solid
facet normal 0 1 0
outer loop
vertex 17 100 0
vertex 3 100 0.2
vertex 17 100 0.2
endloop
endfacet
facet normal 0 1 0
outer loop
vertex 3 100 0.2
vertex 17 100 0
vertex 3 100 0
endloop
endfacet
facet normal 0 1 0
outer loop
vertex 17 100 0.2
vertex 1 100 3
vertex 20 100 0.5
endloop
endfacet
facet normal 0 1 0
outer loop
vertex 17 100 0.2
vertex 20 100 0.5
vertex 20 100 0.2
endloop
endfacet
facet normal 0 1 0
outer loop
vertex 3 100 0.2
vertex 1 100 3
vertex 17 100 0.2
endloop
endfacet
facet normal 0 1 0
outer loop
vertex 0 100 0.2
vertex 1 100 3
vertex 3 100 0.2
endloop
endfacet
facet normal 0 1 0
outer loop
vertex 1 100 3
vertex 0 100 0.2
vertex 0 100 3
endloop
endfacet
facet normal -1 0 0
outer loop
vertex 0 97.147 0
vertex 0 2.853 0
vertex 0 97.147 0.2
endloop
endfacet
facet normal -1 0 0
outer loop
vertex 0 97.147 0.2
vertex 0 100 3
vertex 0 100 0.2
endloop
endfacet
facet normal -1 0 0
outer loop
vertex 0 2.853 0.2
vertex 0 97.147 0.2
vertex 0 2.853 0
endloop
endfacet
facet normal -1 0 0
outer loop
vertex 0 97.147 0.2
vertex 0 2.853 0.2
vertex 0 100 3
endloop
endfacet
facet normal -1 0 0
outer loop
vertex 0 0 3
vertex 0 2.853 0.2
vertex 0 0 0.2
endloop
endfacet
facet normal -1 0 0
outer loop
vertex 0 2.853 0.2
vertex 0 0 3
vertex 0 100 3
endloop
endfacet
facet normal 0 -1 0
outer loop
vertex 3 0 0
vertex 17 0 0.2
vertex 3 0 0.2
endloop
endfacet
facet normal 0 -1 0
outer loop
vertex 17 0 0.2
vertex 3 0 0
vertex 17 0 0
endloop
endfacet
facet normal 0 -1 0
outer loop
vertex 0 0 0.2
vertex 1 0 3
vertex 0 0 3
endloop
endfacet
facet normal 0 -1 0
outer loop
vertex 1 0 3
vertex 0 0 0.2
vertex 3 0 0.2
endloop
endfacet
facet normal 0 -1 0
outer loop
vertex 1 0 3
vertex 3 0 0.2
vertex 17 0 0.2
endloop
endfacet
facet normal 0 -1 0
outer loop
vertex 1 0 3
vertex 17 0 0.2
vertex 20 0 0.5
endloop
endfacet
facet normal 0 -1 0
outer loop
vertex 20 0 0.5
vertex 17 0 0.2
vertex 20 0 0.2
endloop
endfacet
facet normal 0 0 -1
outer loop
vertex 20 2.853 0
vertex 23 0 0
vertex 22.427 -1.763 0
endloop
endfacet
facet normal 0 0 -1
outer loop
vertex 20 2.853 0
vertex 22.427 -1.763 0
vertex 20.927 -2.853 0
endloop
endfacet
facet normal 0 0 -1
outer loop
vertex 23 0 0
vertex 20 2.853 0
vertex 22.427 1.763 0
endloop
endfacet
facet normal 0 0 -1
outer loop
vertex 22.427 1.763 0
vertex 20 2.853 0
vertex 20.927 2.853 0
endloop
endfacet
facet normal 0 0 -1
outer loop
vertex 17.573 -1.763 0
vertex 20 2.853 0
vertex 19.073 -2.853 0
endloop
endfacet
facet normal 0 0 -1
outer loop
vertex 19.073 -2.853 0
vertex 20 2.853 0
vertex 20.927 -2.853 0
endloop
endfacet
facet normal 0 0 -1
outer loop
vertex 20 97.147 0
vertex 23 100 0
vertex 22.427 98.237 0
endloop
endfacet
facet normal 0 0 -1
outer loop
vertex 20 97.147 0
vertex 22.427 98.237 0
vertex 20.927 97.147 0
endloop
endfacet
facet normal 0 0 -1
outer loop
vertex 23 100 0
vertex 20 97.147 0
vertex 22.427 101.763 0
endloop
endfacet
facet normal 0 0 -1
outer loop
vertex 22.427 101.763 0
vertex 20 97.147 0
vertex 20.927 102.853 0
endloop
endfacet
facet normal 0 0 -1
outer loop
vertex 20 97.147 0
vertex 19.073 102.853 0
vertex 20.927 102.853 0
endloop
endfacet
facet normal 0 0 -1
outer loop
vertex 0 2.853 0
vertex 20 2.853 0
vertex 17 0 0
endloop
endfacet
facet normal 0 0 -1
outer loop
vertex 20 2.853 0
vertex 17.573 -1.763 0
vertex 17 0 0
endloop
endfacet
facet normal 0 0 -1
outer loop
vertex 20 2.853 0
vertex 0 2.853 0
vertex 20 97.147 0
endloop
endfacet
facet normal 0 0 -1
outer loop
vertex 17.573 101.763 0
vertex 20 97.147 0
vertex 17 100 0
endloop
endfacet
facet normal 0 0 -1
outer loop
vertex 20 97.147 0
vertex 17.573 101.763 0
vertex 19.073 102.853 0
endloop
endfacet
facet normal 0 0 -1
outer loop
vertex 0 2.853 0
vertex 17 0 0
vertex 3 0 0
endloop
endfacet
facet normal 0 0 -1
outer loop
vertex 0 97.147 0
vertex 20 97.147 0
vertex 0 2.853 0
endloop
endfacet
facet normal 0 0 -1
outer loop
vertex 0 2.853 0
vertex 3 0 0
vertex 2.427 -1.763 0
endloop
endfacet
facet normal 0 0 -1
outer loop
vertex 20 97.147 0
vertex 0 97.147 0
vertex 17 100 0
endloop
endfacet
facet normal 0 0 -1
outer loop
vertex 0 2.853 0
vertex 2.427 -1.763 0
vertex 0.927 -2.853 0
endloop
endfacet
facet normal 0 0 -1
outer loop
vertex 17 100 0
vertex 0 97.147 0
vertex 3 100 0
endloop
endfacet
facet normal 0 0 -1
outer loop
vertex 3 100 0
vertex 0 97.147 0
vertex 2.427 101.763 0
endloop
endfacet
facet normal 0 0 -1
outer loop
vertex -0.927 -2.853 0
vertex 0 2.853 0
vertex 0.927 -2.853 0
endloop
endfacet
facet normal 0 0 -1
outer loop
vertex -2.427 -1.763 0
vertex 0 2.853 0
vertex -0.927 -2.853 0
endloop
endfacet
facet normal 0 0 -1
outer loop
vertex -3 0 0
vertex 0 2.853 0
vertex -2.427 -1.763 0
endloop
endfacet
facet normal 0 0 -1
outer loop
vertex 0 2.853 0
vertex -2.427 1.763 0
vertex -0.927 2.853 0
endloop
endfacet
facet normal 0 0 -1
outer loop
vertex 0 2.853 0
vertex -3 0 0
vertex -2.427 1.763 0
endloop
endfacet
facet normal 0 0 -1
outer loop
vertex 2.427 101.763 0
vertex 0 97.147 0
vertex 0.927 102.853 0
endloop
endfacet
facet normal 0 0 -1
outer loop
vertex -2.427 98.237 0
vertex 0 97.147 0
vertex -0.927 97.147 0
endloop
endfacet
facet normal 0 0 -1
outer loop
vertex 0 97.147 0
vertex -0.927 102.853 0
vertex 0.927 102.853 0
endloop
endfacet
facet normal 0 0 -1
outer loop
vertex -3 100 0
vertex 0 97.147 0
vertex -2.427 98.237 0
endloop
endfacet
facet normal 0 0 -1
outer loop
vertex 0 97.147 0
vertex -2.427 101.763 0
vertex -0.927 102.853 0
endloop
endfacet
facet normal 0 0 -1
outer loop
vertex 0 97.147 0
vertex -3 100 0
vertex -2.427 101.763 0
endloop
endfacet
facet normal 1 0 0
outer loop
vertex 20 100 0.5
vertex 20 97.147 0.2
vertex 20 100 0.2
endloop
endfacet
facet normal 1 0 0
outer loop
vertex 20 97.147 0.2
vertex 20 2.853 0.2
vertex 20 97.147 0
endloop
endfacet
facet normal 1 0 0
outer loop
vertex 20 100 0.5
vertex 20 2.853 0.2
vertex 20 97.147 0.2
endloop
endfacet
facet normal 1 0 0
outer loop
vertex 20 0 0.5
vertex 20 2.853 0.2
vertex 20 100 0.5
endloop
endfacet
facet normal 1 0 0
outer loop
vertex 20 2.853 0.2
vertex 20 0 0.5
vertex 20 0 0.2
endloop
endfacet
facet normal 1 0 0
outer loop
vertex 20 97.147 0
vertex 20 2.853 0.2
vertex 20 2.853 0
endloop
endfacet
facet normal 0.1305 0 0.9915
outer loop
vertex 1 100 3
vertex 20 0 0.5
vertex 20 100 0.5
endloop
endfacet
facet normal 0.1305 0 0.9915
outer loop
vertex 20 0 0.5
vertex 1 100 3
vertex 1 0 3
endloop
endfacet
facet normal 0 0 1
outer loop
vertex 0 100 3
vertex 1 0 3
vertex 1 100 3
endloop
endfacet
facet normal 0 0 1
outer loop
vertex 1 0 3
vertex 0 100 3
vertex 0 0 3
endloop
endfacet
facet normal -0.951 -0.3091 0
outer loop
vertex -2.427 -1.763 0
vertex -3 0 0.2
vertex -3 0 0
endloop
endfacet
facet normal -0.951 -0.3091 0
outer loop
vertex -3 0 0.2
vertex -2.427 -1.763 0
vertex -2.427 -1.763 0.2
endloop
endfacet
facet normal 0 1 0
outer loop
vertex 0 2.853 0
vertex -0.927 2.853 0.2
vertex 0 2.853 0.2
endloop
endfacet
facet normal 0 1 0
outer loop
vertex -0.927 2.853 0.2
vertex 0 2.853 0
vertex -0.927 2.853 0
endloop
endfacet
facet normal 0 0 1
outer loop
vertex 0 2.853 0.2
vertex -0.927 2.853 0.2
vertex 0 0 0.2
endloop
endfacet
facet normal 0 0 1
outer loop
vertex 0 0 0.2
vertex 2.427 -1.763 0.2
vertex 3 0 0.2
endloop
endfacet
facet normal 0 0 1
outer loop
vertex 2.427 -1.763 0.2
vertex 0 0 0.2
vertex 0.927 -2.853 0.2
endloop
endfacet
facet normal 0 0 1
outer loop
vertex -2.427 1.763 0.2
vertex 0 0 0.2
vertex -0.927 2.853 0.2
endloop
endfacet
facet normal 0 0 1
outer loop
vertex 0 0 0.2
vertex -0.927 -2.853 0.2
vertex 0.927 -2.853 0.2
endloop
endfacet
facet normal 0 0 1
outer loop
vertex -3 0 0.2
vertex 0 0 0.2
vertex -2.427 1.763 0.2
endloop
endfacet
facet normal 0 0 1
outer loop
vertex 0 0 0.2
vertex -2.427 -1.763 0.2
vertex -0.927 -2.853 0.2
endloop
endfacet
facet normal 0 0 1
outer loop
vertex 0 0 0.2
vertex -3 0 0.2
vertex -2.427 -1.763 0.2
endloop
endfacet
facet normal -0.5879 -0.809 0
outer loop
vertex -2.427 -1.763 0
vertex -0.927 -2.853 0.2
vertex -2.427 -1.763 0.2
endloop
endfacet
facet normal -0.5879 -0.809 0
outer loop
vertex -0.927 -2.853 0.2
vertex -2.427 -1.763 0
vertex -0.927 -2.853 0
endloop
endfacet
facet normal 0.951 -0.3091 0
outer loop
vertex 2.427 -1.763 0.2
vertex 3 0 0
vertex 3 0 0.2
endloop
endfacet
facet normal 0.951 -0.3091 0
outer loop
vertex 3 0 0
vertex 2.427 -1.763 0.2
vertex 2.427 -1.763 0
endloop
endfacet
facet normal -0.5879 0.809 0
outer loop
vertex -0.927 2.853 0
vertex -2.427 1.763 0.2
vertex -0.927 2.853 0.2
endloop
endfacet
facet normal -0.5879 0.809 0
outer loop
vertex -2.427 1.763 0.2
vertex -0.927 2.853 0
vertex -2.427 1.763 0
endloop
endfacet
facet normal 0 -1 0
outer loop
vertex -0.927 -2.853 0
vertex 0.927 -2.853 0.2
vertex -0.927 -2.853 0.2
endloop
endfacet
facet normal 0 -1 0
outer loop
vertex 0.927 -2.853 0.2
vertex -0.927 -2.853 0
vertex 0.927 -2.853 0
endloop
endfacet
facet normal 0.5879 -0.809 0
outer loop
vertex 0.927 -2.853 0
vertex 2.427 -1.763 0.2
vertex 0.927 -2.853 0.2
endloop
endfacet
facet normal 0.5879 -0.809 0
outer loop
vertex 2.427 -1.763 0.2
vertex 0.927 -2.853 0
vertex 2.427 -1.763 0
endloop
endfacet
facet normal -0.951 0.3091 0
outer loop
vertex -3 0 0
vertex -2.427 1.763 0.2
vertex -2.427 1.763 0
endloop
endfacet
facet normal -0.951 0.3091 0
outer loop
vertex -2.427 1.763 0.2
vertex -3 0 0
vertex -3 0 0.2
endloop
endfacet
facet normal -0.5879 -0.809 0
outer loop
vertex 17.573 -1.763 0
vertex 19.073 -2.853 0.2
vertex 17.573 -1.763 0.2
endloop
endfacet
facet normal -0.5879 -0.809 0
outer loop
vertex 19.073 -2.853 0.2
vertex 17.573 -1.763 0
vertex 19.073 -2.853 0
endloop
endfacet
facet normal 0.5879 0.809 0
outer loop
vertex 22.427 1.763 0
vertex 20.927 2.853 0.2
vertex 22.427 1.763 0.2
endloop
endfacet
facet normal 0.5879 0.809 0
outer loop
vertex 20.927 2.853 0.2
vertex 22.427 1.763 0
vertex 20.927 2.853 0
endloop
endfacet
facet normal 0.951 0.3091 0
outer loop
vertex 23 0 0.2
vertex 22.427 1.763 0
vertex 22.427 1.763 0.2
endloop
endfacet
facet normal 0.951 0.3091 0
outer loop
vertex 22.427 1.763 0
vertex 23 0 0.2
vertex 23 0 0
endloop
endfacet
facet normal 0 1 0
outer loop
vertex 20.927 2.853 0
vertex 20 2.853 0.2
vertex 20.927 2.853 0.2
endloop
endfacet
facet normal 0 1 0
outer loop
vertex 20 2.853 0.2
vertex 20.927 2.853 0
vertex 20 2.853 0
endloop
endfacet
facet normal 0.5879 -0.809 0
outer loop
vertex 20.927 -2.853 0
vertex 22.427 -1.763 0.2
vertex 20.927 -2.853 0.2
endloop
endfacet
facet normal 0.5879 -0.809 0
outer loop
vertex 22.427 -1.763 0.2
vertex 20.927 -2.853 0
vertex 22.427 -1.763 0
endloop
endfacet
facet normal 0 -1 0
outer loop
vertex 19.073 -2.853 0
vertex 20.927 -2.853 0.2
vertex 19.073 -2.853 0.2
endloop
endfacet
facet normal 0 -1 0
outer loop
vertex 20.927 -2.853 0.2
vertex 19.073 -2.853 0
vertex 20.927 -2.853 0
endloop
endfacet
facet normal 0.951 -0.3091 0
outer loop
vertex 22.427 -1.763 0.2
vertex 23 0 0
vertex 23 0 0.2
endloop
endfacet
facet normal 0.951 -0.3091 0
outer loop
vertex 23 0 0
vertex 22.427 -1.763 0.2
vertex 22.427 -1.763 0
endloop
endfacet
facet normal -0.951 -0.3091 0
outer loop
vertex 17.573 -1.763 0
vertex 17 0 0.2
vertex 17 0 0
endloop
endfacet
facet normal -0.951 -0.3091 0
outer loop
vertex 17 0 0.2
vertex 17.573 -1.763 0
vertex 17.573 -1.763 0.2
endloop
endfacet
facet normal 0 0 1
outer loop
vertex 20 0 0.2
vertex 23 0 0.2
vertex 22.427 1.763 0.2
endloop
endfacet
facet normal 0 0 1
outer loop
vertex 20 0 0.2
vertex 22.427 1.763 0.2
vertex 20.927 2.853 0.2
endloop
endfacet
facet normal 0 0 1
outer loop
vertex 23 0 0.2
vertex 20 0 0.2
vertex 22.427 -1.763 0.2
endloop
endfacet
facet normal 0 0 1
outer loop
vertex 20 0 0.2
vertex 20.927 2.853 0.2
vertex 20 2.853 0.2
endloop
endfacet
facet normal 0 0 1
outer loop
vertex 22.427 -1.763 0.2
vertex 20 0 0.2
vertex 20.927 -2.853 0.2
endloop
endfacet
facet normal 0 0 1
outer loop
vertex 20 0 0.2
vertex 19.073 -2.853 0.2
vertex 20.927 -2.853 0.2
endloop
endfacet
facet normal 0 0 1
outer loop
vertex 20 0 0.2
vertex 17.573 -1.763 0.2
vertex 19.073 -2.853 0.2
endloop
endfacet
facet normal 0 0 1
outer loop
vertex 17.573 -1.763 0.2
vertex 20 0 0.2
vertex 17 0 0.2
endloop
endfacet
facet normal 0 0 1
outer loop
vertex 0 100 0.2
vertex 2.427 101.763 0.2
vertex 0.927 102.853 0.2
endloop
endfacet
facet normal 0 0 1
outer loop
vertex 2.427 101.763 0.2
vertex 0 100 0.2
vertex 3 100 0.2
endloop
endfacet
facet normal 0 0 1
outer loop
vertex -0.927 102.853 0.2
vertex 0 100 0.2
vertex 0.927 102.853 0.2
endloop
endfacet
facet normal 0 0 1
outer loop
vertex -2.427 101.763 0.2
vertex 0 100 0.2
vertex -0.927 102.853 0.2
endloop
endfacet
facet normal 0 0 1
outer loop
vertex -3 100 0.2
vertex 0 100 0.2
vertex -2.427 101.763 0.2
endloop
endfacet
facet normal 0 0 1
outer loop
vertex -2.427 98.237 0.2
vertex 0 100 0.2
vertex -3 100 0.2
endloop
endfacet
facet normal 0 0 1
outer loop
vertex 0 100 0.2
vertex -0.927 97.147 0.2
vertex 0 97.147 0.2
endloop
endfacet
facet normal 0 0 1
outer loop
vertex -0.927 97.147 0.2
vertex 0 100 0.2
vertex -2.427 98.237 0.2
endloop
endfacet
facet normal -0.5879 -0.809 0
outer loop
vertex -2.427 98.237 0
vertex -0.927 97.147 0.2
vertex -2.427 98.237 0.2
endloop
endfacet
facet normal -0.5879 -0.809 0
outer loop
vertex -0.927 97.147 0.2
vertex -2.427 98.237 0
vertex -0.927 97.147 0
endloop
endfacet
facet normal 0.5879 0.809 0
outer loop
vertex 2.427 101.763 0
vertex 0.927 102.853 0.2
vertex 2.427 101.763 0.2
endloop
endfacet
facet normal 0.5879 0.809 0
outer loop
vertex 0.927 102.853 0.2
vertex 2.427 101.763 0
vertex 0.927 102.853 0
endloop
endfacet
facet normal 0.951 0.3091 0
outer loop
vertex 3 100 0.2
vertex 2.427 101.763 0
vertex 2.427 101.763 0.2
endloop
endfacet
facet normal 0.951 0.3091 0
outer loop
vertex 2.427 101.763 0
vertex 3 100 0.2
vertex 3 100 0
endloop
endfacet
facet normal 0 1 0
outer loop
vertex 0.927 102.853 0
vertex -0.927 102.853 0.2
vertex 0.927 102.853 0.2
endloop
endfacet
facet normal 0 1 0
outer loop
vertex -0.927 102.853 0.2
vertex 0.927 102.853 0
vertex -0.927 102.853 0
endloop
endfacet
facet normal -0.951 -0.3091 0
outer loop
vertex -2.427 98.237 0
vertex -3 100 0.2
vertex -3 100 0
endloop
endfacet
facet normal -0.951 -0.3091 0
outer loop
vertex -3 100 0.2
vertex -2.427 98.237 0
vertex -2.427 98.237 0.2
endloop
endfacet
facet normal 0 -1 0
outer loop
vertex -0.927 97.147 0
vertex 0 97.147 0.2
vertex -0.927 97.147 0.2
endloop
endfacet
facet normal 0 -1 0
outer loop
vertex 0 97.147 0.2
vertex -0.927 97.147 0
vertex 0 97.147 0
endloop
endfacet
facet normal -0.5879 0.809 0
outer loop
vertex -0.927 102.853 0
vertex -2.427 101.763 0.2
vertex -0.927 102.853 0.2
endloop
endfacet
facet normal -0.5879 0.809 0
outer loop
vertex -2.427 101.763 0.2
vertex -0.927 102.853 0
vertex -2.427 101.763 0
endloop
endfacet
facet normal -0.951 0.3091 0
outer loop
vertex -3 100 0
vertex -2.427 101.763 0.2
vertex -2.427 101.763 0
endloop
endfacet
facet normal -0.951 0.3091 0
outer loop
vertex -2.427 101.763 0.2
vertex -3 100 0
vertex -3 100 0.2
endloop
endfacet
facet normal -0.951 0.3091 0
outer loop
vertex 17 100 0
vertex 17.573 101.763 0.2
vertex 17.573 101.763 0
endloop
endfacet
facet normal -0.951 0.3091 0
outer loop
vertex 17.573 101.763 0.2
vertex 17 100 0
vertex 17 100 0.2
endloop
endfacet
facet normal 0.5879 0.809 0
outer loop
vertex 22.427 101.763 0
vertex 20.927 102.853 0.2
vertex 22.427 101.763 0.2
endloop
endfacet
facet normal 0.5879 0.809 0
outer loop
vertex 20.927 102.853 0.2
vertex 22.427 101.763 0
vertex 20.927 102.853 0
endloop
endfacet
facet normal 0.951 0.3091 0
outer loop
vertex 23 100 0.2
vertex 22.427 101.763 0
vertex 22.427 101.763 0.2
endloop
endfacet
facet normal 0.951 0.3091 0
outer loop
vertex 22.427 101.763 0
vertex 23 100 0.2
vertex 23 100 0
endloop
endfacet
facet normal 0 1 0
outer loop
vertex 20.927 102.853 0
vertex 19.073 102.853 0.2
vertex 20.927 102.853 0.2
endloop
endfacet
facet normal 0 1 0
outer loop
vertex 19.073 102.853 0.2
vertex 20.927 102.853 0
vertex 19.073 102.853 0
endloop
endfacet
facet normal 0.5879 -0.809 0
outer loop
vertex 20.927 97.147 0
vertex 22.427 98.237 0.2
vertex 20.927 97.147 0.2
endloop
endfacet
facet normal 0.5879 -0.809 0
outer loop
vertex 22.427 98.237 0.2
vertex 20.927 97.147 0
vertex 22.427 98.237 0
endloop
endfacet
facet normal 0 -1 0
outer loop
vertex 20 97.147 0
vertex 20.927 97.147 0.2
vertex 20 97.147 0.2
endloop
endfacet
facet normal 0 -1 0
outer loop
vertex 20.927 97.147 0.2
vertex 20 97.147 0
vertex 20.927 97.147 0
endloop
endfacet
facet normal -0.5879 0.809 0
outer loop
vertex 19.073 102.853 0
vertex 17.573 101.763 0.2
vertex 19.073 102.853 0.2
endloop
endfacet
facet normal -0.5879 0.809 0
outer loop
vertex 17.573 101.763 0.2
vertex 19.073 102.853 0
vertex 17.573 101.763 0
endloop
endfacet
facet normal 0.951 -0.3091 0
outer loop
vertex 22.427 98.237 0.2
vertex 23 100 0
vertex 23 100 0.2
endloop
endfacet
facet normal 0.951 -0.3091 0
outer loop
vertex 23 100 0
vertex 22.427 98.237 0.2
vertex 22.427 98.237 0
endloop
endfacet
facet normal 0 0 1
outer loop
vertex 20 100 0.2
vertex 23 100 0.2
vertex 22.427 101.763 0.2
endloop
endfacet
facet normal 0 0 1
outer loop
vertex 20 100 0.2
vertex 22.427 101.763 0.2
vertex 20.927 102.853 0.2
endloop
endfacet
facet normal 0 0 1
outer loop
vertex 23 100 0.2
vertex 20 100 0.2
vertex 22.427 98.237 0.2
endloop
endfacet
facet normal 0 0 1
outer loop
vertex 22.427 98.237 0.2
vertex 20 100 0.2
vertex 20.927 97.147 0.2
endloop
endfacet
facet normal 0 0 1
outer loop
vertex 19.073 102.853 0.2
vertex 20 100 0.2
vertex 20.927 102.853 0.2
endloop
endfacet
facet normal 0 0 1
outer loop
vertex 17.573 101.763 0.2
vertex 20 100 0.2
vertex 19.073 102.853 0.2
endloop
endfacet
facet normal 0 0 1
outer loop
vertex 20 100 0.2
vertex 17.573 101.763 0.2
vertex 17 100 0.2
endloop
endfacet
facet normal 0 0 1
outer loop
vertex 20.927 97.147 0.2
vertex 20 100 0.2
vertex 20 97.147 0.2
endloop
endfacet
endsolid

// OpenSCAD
union () {
	hull () {
		cube([20,100,0.5]);
		cube([1,100,3]);
	}
	//to avoid wrap
	translate([0,0,0]) cylinder(r = 3, h = 0.2);
	translate([20,0,0]) cylinder(r = 3, h = 0.2);
	translate([0,100,0]) cylinder(r = 3, h = 0.2);
	translate([20,100,0]) cylinder(r = 3, h = 0.2);
}
